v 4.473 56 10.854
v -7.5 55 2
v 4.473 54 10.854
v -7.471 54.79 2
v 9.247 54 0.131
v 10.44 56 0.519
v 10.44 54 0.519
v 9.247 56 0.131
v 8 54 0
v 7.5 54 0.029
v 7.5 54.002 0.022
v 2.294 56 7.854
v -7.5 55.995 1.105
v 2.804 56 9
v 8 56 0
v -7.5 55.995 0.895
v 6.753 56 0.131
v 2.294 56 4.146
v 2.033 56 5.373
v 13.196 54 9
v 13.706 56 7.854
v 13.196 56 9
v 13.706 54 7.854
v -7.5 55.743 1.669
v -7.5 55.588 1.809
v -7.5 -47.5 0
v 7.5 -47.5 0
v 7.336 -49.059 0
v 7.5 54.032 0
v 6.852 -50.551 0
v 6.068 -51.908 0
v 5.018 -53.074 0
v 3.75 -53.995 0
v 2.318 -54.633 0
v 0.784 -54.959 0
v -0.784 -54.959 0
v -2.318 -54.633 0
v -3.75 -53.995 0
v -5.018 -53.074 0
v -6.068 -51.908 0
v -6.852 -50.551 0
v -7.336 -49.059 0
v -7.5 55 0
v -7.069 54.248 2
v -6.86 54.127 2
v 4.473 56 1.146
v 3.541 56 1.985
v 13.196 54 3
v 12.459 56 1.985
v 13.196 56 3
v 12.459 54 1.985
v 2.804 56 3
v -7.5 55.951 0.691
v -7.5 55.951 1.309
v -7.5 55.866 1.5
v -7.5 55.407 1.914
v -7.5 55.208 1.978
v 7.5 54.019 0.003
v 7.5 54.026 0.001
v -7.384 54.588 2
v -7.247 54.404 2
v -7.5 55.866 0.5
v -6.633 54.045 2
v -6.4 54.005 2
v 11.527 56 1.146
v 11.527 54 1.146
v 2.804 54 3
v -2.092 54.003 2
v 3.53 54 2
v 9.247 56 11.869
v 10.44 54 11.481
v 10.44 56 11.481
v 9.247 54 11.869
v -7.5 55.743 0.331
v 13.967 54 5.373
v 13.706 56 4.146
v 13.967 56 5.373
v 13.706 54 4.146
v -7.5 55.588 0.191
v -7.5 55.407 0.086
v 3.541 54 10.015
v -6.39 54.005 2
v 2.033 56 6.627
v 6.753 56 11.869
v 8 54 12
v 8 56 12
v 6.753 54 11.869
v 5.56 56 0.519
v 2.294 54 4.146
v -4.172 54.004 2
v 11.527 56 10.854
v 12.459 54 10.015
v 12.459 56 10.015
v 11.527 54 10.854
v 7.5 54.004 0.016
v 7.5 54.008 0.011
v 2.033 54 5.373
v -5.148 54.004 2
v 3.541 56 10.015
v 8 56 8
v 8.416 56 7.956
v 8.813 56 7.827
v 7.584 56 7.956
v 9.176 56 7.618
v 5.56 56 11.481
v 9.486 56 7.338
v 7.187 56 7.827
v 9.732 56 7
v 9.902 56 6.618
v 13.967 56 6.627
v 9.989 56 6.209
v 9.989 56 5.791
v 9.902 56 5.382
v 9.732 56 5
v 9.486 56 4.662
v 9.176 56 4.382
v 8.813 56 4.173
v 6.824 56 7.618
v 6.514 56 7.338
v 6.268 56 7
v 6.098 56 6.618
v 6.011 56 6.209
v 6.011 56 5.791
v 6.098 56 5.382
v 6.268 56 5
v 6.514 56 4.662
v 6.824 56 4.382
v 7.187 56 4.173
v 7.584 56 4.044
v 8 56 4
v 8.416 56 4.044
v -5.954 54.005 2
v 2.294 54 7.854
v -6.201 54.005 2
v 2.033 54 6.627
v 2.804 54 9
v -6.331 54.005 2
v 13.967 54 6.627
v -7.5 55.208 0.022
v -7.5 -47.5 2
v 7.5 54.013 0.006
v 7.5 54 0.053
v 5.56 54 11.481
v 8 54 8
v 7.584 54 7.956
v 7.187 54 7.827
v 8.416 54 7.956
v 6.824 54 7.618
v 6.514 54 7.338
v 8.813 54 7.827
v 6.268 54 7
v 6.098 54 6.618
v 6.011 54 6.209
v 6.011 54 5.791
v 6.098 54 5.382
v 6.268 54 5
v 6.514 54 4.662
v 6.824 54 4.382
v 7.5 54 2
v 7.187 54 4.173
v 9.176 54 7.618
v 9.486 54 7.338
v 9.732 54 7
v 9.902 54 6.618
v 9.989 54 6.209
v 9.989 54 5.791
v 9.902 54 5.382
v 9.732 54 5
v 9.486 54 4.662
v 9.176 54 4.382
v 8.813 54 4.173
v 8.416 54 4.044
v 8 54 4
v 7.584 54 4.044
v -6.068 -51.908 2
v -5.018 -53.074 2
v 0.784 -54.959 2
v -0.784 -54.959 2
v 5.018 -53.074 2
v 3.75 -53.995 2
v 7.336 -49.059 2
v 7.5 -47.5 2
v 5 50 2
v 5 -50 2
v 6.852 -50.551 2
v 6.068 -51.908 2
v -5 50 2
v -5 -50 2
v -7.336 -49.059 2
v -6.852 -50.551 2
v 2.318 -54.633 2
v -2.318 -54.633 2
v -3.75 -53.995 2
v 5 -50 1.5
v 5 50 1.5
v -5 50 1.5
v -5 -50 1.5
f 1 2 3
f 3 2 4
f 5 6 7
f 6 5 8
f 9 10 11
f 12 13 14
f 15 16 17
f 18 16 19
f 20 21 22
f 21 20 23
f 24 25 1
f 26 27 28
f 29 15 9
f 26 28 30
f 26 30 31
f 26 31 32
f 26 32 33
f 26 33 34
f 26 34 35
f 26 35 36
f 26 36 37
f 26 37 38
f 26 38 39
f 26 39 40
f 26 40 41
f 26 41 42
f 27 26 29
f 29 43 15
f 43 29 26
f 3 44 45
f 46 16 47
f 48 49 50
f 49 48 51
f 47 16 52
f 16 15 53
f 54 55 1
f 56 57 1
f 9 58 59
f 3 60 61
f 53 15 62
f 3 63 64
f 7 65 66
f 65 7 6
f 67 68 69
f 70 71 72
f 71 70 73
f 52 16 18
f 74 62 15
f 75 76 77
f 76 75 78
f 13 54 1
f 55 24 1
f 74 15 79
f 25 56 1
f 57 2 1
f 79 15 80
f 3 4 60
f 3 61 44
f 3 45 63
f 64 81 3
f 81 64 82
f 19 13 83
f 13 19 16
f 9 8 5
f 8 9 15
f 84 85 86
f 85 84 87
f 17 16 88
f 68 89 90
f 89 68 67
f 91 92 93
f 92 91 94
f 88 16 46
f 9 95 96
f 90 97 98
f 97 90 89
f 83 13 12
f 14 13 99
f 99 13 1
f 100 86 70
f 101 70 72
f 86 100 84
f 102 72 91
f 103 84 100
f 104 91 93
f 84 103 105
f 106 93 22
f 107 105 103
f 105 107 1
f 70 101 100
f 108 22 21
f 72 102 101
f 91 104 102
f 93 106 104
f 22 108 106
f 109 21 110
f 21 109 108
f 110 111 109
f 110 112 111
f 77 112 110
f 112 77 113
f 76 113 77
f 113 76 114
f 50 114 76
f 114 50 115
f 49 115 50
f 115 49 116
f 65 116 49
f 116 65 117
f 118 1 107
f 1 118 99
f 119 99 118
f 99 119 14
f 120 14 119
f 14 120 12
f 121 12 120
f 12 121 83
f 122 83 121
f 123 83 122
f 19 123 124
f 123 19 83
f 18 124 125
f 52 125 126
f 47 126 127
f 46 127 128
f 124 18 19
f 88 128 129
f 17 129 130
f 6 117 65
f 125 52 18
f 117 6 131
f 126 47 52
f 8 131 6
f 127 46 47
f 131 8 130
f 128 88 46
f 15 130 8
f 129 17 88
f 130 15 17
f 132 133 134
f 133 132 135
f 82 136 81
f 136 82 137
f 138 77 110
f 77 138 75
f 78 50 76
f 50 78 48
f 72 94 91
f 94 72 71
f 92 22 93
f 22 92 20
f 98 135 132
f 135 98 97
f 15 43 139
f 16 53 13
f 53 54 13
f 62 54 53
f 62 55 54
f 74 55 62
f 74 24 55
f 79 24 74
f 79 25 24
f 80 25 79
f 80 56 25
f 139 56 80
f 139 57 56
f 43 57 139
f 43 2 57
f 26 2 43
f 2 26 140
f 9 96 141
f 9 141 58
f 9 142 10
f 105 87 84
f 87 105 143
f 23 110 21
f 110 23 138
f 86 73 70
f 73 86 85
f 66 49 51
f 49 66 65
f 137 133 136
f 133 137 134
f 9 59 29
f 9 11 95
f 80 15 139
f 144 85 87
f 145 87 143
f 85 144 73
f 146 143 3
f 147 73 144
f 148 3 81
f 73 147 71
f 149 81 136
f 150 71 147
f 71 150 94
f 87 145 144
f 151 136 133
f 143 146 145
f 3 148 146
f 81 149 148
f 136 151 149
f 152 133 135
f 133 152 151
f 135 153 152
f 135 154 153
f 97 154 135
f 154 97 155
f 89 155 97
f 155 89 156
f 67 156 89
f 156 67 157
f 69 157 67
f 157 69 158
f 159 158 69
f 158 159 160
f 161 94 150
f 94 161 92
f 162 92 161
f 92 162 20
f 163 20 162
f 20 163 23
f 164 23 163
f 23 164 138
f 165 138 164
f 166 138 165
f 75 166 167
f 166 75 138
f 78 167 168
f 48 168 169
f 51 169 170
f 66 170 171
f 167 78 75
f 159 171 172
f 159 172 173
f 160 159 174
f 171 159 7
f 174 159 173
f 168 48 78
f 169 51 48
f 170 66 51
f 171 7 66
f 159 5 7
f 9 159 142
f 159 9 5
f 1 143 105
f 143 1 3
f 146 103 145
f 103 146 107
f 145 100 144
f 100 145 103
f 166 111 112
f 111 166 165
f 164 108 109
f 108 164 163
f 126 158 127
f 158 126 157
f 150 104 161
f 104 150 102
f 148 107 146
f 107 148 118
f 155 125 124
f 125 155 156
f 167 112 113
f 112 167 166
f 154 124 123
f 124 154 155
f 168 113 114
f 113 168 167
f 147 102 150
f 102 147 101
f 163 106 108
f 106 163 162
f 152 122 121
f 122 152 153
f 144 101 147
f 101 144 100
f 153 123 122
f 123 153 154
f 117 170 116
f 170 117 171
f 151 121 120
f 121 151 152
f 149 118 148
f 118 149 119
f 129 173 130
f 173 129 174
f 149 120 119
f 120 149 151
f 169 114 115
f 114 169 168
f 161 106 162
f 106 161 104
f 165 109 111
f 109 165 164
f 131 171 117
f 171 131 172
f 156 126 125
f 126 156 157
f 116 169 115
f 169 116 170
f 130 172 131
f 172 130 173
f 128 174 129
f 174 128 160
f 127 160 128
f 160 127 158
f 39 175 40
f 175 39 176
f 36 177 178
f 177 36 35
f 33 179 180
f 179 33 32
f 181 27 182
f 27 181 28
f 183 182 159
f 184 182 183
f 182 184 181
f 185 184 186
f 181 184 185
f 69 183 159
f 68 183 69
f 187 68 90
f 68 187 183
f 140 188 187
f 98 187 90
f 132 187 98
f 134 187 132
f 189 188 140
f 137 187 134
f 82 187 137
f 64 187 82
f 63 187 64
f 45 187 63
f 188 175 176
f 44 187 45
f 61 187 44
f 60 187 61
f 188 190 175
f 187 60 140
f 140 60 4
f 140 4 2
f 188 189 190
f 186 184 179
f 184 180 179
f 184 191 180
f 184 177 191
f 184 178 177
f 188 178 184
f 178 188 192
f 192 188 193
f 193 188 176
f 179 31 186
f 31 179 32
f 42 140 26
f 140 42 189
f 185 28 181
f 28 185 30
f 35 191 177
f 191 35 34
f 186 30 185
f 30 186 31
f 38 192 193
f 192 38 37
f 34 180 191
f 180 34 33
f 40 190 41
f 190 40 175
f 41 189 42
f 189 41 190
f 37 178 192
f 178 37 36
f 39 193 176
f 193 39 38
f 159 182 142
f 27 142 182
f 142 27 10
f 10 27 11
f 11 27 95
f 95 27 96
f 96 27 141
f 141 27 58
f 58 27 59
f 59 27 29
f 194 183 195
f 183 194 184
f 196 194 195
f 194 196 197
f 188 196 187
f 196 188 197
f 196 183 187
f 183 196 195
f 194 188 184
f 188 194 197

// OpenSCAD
STRIP_LENGTH = 100;
STRIP_WIDTH = 10;
STRIP_DEPTH = 0.5;

BASE_THICKNESS = 2;
LENGTH = STRIP_LENGTH + 10;
WIDTH = STRIP_WIDTH + 5;

MOUNT_HOLE_DIA = 4;
MOUNT_OFFSET_X = -8;
MOUNT_OFFSET_Z = 5;

$fn = 30;

module strip() {
    translate([0, 0, STRIP_DEPTH/2])
    cube(size = [STRIP_WIDTH, STRIP_LENGTH, STRIP_DEPTH], center = true);
}

module mount() {
    difference() {
        hull() {
            cylinder(d = BASE_THICKNESS, h = WIDTH, center = true);
            translate([MOUNT_OFFSET_Z, 0, MOUNT_OFFSET_X])
            rotate([90, 0, 0])
            cylinder(d = 3   * MOUNT_HOLE_DIA, h = BASE_THICKNESS, center = true);
        }
        translate([MOUNT_OFFSET_Z, 0, MOUNT_OFFSET_X])
        rotate([90, 0, 0])
        cylinder(d = MOUNT_HOLE_DIA, h = BASE_THICKNESS, center = true);

    }
}

module base() {
    hull() {
        translate([0, -(LENGTH-WIDTH)/2, 0])
        cylinder(d = WIDTH, h = BASE_THICKNESS);
        translate([0, LENGTH/2, BASE_THICKNESS/2])
        rotate([0, 90, 0])
        cylinder(d = BASE_THICKNESS, h = WIDTH, center = true);
    }

    translate([0, LENGTH/2, BASE_THICKNESS/2])
    rotate([0, -90, 0])
    mount();
}

difference() {
    base();
    translate([0, 0, BASE_THICKNESS-STRIP_DEPTH])
    strip();
}
